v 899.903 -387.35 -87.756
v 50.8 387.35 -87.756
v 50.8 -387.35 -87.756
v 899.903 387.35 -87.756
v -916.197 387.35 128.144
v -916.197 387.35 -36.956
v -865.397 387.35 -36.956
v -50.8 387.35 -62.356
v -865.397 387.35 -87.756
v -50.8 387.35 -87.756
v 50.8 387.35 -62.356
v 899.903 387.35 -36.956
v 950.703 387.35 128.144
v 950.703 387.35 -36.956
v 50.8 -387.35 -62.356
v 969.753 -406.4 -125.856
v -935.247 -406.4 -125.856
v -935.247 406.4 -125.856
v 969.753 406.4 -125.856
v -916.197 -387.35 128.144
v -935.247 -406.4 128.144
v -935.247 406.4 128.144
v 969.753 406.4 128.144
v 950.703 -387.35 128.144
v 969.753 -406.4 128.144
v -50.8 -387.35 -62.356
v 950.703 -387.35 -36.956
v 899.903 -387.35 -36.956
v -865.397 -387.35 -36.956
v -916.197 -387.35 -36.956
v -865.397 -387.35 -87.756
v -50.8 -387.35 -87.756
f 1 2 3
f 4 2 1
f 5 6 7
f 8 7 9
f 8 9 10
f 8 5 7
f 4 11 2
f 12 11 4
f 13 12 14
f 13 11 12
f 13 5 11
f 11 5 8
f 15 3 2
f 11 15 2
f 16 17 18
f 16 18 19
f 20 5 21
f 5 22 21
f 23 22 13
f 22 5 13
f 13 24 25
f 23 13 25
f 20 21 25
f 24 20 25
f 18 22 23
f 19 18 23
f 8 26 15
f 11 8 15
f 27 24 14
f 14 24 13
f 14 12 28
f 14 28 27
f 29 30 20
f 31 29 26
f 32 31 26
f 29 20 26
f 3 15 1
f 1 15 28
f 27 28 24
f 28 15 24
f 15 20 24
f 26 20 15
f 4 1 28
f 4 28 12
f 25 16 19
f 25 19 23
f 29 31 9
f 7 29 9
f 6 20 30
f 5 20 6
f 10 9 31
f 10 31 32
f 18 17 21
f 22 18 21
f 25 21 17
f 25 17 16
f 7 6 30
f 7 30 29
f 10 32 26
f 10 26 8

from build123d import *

# Parameters (mm, degrees)
F0_W     = 1905
F0_H     = 254
F1_DEPTH = 406.4
F2_W     = 1866.9
F2_H     = 774.7
F3_DEPTH = 215.9
F4_W     = 50.8
F4_H     = 774.7
F5_DEPTH = 50.8
F6_W     = 101.6
F6_H     = 774.7
F7_DEPTH = 25.4


with BuildPart() as f1:
    # F0 (on Front) → F1 (new body, symmetric)
    with BuildSketch(Plane.XZ):
        with Locations((17.253051, 1.14385)):
            Rectangle(F0_W, F0_H)
    extrude(amount=F1_DEPTH, both=True)

    # F2 (on face) → F3 (cut)
    with BuildSketch(Plane.XY.offset(128.14385)):
        with Locations((17.253051, 0)):
            Rectangle(F2_W, F2_H)
    extrude(amount=-F3_DEPTH, mode=Mode.SUBTRACT)

    # F4 (on face) → F5 (join)
    with BuildSketch(Plane.XY.offset(-87.75615)):
        with Locations((-890.796949, 0)):
            Rectangle(F4_W, F4_H)
        with Locations((925.303051, 0)):
            Rectangle(F4_W, F4_H)
    extrude(amount=F5_DEPTH)

    # F6 (on face) → F7 (join)
    with BuildSketch(Plane.XY.offset(-87.75615)):
        Rectangle(F6_W, F6_H)
    extrude(amount=F7_DEPTH)


solid = f1.part
